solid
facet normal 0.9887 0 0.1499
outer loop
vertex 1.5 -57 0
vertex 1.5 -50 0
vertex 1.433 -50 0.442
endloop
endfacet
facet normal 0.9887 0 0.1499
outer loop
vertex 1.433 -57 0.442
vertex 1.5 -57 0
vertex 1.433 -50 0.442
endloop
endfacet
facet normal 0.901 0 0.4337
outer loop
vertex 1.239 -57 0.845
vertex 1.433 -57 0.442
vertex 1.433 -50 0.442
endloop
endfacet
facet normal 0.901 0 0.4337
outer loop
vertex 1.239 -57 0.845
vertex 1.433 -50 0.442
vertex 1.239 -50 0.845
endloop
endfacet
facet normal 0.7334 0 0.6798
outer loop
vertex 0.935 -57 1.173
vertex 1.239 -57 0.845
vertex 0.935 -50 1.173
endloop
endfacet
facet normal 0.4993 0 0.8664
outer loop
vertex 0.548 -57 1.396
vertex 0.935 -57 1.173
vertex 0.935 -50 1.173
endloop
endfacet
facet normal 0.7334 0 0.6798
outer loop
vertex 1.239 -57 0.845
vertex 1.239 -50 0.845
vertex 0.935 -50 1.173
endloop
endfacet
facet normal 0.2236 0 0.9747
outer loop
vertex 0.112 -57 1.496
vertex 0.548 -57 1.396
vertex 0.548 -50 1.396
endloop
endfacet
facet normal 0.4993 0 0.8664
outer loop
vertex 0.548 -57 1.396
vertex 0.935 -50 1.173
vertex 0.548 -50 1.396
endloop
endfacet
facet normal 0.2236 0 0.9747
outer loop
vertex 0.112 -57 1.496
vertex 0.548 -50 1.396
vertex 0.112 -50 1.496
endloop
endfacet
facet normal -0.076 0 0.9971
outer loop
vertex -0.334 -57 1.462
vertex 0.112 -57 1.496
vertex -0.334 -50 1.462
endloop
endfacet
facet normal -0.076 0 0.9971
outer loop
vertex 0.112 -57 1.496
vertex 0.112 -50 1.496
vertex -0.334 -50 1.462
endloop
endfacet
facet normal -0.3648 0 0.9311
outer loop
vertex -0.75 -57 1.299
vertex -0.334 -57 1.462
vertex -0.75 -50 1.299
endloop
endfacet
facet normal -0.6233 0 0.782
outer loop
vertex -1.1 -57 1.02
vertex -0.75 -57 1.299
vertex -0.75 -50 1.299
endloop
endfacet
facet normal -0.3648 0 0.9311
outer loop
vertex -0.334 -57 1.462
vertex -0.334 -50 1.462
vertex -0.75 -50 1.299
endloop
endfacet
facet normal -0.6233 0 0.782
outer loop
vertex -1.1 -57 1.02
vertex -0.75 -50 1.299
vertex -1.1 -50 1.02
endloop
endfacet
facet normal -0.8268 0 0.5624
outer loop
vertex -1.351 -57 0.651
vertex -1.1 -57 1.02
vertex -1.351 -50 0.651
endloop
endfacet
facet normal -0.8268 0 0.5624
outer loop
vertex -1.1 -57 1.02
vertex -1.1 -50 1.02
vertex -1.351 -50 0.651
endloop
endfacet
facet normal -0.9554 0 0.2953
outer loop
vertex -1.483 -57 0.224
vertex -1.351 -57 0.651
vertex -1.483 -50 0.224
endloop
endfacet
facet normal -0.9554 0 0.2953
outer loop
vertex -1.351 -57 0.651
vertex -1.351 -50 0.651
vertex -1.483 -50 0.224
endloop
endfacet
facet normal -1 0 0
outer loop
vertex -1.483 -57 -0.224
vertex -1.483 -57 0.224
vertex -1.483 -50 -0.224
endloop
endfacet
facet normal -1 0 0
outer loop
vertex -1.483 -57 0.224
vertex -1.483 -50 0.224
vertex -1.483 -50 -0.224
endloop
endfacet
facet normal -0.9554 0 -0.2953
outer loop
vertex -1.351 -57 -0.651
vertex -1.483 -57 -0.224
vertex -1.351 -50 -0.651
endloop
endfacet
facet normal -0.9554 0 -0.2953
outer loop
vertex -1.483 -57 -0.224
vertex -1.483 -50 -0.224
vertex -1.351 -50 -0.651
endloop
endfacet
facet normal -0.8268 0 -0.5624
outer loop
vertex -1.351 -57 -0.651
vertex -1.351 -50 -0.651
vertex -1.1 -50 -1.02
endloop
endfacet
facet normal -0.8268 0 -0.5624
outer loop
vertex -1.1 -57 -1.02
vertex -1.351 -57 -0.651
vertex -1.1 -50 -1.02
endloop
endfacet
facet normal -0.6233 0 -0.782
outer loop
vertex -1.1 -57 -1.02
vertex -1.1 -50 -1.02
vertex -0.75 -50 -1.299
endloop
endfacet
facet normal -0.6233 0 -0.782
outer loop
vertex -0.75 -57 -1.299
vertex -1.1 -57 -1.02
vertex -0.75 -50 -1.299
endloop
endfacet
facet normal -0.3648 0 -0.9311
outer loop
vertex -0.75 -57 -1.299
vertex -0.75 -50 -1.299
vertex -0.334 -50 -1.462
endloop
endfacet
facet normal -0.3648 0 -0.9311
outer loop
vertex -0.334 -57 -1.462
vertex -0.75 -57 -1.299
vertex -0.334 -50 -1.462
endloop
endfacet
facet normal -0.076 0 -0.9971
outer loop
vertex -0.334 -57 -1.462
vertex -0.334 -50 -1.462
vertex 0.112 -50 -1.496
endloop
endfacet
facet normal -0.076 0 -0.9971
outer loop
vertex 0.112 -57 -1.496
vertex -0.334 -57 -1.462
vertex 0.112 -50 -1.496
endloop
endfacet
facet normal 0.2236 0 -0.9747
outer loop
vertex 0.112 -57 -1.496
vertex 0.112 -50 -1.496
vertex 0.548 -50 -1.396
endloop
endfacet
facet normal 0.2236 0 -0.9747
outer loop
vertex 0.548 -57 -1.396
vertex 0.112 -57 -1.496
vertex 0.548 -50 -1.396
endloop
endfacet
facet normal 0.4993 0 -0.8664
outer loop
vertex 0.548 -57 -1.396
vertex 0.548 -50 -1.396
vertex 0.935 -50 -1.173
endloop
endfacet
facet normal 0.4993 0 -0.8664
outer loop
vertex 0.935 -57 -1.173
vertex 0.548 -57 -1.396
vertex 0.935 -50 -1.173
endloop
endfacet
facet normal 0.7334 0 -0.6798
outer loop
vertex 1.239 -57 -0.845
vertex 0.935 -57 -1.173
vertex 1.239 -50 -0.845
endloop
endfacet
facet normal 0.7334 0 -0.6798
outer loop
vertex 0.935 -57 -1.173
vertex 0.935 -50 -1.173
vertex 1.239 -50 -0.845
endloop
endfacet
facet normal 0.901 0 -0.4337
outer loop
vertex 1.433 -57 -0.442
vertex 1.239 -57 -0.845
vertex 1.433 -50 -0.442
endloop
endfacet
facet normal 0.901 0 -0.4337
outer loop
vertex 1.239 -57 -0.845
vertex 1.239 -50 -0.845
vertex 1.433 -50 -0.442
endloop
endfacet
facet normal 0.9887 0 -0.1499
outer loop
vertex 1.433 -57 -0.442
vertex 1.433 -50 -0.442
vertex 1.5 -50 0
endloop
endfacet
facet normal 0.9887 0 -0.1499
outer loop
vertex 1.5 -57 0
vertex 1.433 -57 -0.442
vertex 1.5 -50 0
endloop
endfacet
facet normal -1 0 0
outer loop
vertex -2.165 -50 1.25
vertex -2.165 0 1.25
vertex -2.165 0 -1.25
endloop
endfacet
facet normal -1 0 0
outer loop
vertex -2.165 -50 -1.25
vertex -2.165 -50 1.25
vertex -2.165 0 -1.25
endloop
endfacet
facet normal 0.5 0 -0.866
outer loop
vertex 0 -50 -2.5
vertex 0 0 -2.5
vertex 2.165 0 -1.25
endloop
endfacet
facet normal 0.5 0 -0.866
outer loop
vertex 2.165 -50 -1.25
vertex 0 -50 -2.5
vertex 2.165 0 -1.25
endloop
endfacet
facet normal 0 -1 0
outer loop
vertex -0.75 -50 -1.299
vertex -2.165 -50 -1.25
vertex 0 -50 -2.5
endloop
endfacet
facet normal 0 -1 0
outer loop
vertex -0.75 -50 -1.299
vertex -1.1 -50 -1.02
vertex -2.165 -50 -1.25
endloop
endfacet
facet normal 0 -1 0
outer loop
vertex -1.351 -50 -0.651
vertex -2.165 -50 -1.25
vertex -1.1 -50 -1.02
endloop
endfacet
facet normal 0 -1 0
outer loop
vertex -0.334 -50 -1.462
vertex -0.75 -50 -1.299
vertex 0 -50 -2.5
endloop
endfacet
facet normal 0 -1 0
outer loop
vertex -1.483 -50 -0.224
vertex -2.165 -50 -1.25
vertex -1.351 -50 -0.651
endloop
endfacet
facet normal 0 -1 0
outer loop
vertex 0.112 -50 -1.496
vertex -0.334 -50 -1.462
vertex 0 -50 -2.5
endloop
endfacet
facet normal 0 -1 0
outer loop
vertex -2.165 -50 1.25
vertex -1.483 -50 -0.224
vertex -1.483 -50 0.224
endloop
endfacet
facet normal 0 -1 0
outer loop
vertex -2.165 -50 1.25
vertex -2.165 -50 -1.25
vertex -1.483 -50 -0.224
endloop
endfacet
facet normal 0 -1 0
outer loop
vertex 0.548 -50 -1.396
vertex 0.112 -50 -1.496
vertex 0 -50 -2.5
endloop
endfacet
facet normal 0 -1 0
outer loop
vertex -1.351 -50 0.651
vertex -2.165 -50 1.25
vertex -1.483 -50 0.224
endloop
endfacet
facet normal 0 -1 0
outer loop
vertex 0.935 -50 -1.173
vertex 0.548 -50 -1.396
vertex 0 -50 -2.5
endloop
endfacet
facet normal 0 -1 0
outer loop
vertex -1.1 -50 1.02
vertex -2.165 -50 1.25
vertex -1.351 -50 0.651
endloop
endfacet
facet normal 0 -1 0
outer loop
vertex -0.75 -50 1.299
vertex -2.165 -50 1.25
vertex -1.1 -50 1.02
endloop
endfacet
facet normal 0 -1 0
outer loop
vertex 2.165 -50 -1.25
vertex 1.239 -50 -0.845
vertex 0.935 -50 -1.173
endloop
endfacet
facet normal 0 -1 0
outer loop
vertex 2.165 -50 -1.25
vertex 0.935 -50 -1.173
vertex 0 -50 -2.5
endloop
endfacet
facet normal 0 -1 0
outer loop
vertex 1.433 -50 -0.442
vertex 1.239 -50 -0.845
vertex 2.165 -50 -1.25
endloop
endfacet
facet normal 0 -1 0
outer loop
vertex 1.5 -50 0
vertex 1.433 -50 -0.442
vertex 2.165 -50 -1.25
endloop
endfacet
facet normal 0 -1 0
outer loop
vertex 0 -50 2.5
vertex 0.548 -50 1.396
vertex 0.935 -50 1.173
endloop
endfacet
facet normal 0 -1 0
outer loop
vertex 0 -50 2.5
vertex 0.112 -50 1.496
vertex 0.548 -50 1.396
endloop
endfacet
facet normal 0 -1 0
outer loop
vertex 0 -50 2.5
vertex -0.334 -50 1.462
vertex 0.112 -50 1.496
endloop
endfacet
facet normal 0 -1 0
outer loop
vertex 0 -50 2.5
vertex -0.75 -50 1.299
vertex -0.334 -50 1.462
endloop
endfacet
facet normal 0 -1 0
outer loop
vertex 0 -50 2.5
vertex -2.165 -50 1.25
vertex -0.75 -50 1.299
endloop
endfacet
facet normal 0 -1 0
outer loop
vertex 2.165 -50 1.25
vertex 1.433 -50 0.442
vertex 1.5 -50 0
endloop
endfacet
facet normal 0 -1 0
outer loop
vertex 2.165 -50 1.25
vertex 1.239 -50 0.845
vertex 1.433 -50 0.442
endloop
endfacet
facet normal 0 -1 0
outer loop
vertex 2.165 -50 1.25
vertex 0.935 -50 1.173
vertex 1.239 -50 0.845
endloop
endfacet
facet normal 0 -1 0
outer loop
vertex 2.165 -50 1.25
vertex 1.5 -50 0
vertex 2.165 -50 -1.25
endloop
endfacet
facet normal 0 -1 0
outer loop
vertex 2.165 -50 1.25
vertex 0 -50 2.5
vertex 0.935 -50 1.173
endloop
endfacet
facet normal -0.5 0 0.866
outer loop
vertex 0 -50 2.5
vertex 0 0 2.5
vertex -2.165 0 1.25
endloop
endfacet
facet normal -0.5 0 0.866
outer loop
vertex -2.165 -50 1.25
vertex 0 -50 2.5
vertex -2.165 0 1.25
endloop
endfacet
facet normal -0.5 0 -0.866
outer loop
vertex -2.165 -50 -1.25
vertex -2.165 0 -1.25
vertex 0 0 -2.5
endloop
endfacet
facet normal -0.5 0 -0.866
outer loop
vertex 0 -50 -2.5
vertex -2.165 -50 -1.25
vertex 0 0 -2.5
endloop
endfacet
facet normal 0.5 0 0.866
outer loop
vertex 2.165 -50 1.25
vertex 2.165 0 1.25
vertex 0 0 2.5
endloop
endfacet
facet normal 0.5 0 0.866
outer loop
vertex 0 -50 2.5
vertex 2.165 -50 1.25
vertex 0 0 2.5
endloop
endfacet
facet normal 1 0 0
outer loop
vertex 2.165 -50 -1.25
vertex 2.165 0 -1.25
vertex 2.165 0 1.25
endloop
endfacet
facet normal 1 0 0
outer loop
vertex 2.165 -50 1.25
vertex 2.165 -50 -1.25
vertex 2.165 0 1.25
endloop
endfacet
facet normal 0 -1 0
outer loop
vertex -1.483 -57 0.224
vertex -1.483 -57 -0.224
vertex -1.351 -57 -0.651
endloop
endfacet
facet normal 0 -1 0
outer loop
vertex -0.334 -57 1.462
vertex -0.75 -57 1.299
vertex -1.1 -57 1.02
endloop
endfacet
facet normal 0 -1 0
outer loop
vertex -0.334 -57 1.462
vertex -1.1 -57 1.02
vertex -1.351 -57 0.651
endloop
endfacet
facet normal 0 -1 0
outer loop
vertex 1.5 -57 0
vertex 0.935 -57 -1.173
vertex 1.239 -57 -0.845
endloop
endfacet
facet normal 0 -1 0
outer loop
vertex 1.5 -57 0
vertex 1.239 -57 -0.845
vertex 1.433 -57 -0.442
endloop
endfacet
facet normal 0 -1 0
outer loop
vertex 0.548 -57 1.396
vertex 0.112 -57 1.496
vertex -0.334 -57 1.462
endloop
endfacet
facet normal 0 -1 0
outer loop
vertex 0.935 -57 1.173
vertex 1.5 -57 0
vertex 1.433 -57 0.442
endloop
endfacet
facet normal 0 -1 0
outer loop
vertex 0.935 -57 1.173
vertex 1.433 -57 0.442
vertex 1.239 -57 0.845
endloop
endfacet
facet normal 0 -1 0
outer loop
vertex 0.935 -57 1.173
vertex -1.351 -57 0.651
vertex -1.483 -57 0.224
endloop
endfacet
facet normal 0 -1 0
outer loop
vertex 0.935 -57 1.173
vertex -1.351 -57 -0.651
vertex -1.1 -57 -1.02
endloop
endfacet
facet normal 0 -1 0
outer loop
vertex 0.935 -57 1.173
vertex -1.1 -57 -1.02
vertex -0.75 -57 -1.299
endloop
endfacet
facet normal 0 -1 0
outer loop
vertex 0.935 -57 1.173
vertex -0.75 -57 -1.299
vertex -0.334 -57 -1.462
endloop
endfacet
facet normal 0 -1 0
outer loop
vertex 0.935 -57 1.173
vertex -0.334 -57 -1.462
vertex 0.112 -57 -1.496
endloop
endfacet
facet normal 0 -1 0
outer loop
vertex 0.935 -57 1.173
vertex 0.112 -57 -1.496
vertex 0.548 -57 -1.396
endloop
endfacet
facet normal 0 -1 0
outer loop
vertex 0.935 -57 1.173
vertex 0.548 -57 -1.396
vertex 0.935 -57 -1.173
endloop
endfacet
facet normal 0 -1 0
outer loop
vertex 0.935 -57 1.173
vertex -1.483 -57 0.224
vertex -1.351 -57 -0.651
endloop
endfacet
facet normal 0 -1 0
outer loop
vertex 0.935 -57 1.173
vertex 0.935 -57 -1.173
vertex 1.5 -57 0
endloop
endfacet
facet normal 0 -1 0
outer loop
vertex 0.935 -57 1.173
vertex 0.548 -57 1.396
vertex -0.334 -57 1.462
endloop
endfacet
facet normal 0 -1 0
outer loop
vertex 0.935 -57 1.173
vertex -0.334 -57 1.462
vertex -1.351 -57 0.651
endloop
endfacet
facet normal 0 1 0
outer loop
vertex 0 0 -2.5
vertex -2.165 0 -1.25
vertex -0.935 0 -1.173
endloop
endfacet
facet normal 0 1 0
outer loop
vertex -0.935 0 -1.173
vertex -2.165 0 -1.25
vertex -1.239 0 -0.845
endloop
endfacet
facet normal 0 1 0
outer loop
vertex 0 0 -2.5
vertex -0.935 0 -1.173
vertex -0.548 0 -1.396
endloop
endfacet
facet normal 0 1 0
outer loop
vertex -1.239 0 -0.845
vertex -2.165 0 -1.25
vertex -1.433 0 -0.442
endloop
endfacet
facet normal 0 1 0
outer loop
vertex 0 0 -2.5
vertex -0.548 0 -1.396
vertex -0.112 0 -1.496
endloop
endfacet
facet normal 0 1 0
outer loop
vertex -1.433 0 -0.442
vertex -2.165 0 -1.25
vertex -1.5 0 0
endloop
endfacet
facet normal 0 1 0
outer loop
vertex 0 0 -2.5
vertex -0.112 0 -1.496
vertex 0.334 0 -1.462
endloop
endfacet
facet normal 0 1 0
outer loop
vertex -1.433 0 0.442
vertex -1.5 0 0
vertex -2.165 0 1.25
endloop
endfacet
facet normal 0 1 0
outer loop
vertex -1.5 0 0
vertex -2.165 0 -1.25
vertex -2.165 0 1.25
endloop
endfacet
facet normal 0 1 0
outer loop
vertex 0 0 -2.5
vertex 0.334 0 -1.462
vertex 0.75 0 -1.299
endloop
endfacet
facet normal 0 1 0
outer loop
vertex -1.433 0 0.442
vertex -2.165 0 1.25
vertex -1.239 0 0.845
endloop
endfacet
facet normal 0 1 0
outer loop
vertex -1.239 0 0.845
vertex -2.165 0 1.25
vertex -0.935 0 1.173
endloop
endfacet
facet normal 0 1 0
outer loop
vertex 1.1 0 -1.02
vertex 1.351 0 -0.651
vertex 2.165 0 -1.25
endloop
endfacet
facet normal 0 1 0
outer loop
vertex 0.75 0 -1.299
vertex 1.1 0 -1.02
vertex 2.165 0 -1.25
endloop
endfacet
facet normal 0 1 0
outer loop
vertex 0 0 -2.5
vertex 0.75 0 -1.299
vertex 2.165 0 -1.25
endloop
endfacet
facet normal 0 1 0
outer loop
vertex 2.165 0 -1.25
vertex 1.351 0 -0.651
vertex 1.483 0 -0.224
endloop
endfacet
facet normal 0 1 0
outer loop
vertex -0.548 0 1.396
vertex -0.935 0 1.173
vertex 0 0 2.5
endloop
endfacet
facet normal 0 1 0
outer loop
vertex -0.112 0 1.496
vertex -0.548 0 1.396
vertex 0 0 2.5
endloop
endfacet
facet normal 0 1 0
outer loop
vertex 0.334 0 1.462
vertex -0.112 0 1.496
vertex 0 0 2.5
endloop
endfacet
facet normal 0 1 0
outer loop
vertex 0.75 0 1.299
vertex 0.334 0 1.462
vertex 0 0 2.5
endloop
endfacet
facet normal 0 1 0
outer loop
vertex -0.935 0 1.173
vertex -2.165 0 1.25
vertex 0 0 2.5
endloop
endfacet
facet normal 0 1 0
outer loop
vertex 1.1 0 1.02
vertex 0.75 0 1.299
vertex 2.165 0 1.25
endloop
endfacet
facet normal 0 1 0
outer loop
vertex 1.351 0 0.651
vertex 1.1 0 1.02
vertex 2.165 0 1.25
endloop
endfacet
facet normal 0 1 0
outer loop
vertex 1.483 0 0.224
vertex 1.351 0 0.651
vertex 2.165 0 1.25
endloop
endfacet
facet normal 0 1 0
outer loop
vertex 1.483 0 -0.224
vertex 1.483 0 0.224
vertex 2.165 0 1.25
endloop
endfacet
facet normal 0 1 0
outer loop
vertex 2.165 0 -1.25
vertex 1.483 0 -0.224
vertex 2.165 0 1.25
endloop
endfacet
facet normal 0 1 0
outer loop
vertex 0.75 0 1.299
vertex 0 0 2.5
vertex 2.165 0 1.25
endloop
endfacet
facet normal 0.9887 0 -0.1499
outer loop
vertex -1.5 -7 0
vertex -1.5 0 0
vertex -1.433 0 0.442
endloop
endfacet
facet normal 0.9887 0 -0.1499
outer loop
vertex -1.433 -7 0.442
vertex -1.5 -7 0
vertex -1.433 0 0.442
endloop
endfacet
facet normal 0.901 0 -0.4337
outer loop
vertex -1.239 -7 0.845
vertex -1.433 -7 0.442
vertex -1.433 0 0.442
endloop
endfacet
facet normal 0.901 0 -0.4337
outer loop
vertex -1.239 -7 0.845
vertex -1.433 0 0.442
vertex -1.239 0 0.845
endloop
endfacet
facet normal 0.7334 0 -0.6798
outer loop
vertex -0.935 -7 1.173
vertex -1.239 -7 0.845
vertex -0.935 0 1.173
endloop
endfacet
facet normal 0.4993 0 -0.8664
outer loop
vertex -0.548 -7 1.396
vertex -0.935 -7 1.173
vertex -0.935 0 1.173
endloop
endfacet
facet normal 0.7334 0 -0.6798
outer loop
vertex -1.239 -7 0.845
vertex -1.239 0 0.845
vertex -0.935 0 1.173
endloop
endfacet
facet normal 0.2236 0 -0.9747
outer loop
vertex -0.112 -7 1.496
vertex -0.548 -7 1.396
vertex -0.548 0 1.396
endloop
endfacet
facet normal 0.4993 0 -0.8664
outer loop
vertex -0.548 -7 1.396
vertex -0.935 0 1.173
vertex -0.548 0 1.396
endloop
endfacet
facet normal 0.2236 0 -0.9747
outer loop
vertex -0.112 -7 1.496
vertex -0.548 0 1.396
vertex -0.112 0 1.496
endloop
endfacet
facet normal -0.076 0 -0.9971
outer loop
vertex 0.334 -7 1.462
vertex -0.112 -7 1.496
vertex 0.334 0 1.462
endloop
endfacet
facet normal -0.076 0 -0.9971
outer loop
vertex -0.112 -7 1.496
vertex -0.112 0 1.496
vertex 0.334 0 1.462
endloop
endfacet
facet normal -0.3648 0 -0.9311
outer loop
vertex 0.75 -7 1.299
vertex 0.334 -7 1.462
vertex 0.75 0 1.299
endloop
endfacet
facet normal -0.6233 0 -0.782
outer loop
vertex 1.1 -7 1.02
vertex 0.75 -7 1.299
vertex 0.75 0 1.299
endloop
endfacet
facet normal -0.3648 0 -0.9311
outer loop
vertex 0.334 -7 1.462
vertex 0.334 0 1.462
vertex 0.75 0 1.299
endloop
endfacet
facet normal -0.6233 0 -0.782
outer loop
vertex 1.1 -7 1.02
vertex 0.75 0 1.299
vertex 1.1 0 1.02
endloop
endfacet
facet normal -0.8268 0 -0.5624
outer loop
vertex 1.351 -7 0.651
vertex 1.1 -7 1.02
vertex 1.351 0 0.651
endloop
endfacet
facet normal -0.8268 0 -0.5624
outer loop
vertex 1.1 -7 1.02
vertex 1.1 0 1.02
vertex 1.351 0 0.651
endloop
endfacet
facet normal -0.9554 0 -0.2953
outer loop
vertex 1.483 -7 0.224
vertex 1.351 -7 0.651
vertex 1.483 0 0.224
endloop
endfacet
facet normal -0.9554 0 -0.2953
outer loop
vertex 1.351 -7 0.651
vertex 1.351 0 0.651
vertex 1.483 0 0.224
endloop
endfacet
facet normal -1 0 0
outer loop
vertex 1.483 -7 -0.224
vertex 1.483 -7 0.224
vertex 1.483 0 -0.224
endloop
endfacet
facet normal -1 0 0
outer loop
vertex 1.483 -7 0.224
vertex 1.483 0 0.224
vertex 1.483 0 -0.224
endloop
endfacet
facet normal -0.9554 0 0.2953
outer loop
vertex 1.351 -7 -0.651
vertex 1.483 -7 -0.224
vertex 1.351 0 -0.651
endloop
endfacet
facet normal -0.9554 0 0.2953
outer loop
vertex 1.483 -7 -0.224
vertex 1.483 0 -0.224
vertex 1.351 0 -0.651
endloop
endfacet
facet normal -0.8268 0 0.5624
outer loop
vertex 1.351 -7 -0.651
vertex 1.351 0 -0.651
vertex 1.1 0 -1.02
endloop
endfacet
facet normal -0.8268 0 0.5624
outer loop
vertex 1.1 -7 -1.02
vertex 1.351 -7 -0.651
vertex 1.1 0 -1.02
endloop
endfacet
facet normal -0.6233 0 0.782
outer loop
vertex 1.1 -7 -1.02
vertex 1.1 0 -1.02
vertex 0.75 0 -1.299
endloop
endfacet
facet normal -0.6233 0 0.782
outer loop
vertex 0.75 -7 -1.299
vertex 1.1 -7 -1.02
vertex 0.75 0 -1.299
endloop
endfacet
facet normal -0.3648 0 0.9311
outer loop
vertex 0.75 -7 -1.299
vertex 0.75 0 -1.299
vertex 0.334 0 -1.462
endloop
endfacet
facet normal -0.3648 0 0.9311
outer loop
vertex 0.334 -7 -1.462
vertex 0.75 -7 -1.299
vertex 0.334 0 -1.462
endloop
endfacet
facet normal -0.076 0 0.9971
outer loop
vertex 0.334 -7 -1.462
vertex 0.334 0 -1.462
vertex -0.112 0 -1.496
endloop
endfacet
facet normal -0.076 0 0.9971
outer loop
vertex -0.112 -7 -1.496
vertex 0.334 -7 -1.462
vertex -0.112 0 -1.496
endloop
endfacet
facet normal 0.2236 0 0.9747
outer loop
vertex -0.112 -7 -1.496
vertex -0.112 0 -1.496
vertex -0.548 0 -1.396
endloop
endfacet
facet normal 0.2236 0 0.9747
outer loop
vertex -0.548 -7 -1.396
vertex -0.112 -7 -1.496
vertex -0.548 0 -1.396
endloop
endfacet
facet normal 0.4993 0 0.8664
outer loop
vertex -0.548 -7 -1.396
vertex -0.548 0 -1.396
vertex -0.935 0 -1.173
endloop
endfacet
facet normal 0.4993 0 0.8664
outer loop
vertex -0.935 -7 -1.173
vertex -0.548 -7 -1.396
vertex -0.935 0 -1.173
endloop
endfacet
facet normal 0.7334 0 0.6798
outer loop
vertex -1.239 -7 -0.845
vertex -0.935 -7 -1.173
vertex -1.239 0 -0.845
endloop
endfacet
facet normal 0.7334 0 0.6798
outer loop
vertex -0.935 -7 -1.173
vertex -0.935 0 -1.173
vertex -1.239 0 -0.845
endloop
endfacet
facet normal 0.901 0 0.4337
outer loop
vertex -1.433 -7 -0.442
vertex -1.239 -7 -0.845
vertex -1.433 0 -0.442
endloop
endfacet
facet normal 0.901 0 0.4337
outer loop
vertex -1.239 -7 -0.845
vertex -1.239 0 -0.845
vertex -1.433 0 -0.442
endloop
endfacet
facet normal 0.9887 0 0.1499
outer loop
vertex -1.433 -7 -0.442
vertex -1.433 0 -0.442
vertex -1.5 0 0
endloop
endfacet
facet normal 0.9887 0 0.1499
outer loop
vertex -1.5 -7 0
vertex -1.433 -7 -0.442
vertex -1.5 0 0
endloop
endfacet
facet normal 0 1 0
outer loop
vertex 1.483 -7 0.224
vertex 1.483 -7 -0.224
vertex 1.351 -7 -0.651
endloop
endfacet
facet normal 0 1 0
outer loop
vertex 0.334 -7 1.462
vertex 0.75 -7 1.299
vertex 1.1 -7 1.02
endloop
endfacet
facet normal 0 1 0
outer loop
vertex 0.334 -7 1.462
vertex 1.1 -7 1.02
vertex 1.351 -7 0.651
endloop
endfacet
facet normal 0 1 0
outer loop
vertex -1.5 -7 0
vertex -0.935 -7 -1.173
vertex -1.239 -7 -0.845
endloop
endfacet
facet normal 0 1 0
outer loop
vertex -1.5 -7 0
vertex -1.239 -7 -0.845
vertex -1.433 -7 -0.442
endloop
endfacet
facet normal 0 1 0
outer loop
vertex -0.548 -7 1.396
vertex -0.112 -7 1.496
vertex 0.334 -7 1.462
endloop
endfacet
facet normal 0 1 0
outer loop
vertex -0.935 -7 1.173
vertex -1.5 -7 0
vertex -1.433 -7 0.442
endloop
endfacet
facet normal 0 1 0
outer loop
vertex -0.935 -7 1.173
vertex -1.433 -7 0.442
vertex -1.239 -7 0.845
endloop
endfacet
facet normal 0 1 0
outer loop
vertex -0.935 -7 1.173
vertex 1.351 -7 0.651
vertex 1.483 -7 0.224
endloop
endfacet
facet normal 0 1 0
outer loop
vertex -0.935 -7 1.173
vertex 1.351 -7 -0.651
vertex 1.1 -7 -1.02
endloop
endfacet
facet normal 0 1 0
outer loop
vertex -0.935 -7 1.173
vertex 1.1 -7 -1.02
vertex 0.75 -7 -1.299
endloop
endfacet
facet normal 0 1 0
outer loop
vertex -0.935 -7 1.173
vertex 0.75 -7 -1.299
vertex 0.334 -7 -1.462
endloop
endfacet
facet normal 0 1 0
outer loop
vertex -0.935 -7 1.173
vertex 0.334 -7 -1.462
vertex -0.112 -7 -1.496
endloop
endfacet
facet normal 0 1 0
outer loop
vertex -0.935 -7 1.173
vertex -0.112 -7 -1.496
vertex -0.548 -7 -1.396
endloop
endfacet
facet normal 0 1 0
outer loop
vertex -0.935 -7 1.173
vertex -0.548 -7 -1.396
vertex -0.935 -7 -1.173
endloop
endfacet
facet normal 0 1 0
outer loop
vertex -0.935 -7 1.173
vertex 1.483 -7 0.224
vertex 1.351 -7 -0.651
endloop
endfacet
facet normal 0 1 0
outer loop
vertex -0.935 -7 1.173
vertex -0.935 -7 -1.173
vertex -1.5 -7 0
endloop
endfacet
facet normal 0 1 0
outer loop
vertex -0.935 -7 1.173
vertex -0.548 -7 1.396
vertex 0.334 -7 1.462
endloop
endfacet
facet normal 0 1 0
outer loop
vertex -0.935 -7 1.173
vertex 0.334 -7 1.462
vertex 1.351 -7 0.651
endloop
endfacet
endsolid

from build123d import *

# Parameters (mm, degrees)
F1_DEPTH = 50
F2_R     = 1.5
F3_DEPTH = 7
F4_R     = 1.5
F5_DEPTH = 7


with BuildPart() as f1:
    # F0 (on Front) → F1 (new body)
    with BuildSketch(Plane.XZ):
        Polygon((-2.165064, 1.25), (0, 0), (0, 2.5), align=None)
        Polygon((2.165064, -1.25), (0, 0), (0, -2.5), align=None)
        Polygon((0, 2.5), (0, 0), (2.165064, 1.25), align=None)
        Polygon((2.165064, 1.25), (0, 0), (2.165064, -1.25), align=None)
        Polygon((0, -2.5), (0, 0), (-2.165064, -1.25), align=None)
        Polygon((-2.165064, -1.25), (0, 0), (-2.165064, 1.25), align=None)
    extrude(amount=F1_DEPTH)

    # F2 (on face) → F3 (join)
    with BuildSketch(Plane.XZ.offset(50)):
        Circle(F2_R)
    extrude(amount=F3_DEPTH)

    # F4 (on face) → F5 (cut)
    with BuildSketch(Plane(origin=(0, 0, 0), x_dir=(-1, 0, 0), z_dir=(0, 1, 0))):
        Circle(F4_R)
    extrude(amount=-F5_DEPTH, mode=Mode.SUBTRACT)


solid = f1.part
